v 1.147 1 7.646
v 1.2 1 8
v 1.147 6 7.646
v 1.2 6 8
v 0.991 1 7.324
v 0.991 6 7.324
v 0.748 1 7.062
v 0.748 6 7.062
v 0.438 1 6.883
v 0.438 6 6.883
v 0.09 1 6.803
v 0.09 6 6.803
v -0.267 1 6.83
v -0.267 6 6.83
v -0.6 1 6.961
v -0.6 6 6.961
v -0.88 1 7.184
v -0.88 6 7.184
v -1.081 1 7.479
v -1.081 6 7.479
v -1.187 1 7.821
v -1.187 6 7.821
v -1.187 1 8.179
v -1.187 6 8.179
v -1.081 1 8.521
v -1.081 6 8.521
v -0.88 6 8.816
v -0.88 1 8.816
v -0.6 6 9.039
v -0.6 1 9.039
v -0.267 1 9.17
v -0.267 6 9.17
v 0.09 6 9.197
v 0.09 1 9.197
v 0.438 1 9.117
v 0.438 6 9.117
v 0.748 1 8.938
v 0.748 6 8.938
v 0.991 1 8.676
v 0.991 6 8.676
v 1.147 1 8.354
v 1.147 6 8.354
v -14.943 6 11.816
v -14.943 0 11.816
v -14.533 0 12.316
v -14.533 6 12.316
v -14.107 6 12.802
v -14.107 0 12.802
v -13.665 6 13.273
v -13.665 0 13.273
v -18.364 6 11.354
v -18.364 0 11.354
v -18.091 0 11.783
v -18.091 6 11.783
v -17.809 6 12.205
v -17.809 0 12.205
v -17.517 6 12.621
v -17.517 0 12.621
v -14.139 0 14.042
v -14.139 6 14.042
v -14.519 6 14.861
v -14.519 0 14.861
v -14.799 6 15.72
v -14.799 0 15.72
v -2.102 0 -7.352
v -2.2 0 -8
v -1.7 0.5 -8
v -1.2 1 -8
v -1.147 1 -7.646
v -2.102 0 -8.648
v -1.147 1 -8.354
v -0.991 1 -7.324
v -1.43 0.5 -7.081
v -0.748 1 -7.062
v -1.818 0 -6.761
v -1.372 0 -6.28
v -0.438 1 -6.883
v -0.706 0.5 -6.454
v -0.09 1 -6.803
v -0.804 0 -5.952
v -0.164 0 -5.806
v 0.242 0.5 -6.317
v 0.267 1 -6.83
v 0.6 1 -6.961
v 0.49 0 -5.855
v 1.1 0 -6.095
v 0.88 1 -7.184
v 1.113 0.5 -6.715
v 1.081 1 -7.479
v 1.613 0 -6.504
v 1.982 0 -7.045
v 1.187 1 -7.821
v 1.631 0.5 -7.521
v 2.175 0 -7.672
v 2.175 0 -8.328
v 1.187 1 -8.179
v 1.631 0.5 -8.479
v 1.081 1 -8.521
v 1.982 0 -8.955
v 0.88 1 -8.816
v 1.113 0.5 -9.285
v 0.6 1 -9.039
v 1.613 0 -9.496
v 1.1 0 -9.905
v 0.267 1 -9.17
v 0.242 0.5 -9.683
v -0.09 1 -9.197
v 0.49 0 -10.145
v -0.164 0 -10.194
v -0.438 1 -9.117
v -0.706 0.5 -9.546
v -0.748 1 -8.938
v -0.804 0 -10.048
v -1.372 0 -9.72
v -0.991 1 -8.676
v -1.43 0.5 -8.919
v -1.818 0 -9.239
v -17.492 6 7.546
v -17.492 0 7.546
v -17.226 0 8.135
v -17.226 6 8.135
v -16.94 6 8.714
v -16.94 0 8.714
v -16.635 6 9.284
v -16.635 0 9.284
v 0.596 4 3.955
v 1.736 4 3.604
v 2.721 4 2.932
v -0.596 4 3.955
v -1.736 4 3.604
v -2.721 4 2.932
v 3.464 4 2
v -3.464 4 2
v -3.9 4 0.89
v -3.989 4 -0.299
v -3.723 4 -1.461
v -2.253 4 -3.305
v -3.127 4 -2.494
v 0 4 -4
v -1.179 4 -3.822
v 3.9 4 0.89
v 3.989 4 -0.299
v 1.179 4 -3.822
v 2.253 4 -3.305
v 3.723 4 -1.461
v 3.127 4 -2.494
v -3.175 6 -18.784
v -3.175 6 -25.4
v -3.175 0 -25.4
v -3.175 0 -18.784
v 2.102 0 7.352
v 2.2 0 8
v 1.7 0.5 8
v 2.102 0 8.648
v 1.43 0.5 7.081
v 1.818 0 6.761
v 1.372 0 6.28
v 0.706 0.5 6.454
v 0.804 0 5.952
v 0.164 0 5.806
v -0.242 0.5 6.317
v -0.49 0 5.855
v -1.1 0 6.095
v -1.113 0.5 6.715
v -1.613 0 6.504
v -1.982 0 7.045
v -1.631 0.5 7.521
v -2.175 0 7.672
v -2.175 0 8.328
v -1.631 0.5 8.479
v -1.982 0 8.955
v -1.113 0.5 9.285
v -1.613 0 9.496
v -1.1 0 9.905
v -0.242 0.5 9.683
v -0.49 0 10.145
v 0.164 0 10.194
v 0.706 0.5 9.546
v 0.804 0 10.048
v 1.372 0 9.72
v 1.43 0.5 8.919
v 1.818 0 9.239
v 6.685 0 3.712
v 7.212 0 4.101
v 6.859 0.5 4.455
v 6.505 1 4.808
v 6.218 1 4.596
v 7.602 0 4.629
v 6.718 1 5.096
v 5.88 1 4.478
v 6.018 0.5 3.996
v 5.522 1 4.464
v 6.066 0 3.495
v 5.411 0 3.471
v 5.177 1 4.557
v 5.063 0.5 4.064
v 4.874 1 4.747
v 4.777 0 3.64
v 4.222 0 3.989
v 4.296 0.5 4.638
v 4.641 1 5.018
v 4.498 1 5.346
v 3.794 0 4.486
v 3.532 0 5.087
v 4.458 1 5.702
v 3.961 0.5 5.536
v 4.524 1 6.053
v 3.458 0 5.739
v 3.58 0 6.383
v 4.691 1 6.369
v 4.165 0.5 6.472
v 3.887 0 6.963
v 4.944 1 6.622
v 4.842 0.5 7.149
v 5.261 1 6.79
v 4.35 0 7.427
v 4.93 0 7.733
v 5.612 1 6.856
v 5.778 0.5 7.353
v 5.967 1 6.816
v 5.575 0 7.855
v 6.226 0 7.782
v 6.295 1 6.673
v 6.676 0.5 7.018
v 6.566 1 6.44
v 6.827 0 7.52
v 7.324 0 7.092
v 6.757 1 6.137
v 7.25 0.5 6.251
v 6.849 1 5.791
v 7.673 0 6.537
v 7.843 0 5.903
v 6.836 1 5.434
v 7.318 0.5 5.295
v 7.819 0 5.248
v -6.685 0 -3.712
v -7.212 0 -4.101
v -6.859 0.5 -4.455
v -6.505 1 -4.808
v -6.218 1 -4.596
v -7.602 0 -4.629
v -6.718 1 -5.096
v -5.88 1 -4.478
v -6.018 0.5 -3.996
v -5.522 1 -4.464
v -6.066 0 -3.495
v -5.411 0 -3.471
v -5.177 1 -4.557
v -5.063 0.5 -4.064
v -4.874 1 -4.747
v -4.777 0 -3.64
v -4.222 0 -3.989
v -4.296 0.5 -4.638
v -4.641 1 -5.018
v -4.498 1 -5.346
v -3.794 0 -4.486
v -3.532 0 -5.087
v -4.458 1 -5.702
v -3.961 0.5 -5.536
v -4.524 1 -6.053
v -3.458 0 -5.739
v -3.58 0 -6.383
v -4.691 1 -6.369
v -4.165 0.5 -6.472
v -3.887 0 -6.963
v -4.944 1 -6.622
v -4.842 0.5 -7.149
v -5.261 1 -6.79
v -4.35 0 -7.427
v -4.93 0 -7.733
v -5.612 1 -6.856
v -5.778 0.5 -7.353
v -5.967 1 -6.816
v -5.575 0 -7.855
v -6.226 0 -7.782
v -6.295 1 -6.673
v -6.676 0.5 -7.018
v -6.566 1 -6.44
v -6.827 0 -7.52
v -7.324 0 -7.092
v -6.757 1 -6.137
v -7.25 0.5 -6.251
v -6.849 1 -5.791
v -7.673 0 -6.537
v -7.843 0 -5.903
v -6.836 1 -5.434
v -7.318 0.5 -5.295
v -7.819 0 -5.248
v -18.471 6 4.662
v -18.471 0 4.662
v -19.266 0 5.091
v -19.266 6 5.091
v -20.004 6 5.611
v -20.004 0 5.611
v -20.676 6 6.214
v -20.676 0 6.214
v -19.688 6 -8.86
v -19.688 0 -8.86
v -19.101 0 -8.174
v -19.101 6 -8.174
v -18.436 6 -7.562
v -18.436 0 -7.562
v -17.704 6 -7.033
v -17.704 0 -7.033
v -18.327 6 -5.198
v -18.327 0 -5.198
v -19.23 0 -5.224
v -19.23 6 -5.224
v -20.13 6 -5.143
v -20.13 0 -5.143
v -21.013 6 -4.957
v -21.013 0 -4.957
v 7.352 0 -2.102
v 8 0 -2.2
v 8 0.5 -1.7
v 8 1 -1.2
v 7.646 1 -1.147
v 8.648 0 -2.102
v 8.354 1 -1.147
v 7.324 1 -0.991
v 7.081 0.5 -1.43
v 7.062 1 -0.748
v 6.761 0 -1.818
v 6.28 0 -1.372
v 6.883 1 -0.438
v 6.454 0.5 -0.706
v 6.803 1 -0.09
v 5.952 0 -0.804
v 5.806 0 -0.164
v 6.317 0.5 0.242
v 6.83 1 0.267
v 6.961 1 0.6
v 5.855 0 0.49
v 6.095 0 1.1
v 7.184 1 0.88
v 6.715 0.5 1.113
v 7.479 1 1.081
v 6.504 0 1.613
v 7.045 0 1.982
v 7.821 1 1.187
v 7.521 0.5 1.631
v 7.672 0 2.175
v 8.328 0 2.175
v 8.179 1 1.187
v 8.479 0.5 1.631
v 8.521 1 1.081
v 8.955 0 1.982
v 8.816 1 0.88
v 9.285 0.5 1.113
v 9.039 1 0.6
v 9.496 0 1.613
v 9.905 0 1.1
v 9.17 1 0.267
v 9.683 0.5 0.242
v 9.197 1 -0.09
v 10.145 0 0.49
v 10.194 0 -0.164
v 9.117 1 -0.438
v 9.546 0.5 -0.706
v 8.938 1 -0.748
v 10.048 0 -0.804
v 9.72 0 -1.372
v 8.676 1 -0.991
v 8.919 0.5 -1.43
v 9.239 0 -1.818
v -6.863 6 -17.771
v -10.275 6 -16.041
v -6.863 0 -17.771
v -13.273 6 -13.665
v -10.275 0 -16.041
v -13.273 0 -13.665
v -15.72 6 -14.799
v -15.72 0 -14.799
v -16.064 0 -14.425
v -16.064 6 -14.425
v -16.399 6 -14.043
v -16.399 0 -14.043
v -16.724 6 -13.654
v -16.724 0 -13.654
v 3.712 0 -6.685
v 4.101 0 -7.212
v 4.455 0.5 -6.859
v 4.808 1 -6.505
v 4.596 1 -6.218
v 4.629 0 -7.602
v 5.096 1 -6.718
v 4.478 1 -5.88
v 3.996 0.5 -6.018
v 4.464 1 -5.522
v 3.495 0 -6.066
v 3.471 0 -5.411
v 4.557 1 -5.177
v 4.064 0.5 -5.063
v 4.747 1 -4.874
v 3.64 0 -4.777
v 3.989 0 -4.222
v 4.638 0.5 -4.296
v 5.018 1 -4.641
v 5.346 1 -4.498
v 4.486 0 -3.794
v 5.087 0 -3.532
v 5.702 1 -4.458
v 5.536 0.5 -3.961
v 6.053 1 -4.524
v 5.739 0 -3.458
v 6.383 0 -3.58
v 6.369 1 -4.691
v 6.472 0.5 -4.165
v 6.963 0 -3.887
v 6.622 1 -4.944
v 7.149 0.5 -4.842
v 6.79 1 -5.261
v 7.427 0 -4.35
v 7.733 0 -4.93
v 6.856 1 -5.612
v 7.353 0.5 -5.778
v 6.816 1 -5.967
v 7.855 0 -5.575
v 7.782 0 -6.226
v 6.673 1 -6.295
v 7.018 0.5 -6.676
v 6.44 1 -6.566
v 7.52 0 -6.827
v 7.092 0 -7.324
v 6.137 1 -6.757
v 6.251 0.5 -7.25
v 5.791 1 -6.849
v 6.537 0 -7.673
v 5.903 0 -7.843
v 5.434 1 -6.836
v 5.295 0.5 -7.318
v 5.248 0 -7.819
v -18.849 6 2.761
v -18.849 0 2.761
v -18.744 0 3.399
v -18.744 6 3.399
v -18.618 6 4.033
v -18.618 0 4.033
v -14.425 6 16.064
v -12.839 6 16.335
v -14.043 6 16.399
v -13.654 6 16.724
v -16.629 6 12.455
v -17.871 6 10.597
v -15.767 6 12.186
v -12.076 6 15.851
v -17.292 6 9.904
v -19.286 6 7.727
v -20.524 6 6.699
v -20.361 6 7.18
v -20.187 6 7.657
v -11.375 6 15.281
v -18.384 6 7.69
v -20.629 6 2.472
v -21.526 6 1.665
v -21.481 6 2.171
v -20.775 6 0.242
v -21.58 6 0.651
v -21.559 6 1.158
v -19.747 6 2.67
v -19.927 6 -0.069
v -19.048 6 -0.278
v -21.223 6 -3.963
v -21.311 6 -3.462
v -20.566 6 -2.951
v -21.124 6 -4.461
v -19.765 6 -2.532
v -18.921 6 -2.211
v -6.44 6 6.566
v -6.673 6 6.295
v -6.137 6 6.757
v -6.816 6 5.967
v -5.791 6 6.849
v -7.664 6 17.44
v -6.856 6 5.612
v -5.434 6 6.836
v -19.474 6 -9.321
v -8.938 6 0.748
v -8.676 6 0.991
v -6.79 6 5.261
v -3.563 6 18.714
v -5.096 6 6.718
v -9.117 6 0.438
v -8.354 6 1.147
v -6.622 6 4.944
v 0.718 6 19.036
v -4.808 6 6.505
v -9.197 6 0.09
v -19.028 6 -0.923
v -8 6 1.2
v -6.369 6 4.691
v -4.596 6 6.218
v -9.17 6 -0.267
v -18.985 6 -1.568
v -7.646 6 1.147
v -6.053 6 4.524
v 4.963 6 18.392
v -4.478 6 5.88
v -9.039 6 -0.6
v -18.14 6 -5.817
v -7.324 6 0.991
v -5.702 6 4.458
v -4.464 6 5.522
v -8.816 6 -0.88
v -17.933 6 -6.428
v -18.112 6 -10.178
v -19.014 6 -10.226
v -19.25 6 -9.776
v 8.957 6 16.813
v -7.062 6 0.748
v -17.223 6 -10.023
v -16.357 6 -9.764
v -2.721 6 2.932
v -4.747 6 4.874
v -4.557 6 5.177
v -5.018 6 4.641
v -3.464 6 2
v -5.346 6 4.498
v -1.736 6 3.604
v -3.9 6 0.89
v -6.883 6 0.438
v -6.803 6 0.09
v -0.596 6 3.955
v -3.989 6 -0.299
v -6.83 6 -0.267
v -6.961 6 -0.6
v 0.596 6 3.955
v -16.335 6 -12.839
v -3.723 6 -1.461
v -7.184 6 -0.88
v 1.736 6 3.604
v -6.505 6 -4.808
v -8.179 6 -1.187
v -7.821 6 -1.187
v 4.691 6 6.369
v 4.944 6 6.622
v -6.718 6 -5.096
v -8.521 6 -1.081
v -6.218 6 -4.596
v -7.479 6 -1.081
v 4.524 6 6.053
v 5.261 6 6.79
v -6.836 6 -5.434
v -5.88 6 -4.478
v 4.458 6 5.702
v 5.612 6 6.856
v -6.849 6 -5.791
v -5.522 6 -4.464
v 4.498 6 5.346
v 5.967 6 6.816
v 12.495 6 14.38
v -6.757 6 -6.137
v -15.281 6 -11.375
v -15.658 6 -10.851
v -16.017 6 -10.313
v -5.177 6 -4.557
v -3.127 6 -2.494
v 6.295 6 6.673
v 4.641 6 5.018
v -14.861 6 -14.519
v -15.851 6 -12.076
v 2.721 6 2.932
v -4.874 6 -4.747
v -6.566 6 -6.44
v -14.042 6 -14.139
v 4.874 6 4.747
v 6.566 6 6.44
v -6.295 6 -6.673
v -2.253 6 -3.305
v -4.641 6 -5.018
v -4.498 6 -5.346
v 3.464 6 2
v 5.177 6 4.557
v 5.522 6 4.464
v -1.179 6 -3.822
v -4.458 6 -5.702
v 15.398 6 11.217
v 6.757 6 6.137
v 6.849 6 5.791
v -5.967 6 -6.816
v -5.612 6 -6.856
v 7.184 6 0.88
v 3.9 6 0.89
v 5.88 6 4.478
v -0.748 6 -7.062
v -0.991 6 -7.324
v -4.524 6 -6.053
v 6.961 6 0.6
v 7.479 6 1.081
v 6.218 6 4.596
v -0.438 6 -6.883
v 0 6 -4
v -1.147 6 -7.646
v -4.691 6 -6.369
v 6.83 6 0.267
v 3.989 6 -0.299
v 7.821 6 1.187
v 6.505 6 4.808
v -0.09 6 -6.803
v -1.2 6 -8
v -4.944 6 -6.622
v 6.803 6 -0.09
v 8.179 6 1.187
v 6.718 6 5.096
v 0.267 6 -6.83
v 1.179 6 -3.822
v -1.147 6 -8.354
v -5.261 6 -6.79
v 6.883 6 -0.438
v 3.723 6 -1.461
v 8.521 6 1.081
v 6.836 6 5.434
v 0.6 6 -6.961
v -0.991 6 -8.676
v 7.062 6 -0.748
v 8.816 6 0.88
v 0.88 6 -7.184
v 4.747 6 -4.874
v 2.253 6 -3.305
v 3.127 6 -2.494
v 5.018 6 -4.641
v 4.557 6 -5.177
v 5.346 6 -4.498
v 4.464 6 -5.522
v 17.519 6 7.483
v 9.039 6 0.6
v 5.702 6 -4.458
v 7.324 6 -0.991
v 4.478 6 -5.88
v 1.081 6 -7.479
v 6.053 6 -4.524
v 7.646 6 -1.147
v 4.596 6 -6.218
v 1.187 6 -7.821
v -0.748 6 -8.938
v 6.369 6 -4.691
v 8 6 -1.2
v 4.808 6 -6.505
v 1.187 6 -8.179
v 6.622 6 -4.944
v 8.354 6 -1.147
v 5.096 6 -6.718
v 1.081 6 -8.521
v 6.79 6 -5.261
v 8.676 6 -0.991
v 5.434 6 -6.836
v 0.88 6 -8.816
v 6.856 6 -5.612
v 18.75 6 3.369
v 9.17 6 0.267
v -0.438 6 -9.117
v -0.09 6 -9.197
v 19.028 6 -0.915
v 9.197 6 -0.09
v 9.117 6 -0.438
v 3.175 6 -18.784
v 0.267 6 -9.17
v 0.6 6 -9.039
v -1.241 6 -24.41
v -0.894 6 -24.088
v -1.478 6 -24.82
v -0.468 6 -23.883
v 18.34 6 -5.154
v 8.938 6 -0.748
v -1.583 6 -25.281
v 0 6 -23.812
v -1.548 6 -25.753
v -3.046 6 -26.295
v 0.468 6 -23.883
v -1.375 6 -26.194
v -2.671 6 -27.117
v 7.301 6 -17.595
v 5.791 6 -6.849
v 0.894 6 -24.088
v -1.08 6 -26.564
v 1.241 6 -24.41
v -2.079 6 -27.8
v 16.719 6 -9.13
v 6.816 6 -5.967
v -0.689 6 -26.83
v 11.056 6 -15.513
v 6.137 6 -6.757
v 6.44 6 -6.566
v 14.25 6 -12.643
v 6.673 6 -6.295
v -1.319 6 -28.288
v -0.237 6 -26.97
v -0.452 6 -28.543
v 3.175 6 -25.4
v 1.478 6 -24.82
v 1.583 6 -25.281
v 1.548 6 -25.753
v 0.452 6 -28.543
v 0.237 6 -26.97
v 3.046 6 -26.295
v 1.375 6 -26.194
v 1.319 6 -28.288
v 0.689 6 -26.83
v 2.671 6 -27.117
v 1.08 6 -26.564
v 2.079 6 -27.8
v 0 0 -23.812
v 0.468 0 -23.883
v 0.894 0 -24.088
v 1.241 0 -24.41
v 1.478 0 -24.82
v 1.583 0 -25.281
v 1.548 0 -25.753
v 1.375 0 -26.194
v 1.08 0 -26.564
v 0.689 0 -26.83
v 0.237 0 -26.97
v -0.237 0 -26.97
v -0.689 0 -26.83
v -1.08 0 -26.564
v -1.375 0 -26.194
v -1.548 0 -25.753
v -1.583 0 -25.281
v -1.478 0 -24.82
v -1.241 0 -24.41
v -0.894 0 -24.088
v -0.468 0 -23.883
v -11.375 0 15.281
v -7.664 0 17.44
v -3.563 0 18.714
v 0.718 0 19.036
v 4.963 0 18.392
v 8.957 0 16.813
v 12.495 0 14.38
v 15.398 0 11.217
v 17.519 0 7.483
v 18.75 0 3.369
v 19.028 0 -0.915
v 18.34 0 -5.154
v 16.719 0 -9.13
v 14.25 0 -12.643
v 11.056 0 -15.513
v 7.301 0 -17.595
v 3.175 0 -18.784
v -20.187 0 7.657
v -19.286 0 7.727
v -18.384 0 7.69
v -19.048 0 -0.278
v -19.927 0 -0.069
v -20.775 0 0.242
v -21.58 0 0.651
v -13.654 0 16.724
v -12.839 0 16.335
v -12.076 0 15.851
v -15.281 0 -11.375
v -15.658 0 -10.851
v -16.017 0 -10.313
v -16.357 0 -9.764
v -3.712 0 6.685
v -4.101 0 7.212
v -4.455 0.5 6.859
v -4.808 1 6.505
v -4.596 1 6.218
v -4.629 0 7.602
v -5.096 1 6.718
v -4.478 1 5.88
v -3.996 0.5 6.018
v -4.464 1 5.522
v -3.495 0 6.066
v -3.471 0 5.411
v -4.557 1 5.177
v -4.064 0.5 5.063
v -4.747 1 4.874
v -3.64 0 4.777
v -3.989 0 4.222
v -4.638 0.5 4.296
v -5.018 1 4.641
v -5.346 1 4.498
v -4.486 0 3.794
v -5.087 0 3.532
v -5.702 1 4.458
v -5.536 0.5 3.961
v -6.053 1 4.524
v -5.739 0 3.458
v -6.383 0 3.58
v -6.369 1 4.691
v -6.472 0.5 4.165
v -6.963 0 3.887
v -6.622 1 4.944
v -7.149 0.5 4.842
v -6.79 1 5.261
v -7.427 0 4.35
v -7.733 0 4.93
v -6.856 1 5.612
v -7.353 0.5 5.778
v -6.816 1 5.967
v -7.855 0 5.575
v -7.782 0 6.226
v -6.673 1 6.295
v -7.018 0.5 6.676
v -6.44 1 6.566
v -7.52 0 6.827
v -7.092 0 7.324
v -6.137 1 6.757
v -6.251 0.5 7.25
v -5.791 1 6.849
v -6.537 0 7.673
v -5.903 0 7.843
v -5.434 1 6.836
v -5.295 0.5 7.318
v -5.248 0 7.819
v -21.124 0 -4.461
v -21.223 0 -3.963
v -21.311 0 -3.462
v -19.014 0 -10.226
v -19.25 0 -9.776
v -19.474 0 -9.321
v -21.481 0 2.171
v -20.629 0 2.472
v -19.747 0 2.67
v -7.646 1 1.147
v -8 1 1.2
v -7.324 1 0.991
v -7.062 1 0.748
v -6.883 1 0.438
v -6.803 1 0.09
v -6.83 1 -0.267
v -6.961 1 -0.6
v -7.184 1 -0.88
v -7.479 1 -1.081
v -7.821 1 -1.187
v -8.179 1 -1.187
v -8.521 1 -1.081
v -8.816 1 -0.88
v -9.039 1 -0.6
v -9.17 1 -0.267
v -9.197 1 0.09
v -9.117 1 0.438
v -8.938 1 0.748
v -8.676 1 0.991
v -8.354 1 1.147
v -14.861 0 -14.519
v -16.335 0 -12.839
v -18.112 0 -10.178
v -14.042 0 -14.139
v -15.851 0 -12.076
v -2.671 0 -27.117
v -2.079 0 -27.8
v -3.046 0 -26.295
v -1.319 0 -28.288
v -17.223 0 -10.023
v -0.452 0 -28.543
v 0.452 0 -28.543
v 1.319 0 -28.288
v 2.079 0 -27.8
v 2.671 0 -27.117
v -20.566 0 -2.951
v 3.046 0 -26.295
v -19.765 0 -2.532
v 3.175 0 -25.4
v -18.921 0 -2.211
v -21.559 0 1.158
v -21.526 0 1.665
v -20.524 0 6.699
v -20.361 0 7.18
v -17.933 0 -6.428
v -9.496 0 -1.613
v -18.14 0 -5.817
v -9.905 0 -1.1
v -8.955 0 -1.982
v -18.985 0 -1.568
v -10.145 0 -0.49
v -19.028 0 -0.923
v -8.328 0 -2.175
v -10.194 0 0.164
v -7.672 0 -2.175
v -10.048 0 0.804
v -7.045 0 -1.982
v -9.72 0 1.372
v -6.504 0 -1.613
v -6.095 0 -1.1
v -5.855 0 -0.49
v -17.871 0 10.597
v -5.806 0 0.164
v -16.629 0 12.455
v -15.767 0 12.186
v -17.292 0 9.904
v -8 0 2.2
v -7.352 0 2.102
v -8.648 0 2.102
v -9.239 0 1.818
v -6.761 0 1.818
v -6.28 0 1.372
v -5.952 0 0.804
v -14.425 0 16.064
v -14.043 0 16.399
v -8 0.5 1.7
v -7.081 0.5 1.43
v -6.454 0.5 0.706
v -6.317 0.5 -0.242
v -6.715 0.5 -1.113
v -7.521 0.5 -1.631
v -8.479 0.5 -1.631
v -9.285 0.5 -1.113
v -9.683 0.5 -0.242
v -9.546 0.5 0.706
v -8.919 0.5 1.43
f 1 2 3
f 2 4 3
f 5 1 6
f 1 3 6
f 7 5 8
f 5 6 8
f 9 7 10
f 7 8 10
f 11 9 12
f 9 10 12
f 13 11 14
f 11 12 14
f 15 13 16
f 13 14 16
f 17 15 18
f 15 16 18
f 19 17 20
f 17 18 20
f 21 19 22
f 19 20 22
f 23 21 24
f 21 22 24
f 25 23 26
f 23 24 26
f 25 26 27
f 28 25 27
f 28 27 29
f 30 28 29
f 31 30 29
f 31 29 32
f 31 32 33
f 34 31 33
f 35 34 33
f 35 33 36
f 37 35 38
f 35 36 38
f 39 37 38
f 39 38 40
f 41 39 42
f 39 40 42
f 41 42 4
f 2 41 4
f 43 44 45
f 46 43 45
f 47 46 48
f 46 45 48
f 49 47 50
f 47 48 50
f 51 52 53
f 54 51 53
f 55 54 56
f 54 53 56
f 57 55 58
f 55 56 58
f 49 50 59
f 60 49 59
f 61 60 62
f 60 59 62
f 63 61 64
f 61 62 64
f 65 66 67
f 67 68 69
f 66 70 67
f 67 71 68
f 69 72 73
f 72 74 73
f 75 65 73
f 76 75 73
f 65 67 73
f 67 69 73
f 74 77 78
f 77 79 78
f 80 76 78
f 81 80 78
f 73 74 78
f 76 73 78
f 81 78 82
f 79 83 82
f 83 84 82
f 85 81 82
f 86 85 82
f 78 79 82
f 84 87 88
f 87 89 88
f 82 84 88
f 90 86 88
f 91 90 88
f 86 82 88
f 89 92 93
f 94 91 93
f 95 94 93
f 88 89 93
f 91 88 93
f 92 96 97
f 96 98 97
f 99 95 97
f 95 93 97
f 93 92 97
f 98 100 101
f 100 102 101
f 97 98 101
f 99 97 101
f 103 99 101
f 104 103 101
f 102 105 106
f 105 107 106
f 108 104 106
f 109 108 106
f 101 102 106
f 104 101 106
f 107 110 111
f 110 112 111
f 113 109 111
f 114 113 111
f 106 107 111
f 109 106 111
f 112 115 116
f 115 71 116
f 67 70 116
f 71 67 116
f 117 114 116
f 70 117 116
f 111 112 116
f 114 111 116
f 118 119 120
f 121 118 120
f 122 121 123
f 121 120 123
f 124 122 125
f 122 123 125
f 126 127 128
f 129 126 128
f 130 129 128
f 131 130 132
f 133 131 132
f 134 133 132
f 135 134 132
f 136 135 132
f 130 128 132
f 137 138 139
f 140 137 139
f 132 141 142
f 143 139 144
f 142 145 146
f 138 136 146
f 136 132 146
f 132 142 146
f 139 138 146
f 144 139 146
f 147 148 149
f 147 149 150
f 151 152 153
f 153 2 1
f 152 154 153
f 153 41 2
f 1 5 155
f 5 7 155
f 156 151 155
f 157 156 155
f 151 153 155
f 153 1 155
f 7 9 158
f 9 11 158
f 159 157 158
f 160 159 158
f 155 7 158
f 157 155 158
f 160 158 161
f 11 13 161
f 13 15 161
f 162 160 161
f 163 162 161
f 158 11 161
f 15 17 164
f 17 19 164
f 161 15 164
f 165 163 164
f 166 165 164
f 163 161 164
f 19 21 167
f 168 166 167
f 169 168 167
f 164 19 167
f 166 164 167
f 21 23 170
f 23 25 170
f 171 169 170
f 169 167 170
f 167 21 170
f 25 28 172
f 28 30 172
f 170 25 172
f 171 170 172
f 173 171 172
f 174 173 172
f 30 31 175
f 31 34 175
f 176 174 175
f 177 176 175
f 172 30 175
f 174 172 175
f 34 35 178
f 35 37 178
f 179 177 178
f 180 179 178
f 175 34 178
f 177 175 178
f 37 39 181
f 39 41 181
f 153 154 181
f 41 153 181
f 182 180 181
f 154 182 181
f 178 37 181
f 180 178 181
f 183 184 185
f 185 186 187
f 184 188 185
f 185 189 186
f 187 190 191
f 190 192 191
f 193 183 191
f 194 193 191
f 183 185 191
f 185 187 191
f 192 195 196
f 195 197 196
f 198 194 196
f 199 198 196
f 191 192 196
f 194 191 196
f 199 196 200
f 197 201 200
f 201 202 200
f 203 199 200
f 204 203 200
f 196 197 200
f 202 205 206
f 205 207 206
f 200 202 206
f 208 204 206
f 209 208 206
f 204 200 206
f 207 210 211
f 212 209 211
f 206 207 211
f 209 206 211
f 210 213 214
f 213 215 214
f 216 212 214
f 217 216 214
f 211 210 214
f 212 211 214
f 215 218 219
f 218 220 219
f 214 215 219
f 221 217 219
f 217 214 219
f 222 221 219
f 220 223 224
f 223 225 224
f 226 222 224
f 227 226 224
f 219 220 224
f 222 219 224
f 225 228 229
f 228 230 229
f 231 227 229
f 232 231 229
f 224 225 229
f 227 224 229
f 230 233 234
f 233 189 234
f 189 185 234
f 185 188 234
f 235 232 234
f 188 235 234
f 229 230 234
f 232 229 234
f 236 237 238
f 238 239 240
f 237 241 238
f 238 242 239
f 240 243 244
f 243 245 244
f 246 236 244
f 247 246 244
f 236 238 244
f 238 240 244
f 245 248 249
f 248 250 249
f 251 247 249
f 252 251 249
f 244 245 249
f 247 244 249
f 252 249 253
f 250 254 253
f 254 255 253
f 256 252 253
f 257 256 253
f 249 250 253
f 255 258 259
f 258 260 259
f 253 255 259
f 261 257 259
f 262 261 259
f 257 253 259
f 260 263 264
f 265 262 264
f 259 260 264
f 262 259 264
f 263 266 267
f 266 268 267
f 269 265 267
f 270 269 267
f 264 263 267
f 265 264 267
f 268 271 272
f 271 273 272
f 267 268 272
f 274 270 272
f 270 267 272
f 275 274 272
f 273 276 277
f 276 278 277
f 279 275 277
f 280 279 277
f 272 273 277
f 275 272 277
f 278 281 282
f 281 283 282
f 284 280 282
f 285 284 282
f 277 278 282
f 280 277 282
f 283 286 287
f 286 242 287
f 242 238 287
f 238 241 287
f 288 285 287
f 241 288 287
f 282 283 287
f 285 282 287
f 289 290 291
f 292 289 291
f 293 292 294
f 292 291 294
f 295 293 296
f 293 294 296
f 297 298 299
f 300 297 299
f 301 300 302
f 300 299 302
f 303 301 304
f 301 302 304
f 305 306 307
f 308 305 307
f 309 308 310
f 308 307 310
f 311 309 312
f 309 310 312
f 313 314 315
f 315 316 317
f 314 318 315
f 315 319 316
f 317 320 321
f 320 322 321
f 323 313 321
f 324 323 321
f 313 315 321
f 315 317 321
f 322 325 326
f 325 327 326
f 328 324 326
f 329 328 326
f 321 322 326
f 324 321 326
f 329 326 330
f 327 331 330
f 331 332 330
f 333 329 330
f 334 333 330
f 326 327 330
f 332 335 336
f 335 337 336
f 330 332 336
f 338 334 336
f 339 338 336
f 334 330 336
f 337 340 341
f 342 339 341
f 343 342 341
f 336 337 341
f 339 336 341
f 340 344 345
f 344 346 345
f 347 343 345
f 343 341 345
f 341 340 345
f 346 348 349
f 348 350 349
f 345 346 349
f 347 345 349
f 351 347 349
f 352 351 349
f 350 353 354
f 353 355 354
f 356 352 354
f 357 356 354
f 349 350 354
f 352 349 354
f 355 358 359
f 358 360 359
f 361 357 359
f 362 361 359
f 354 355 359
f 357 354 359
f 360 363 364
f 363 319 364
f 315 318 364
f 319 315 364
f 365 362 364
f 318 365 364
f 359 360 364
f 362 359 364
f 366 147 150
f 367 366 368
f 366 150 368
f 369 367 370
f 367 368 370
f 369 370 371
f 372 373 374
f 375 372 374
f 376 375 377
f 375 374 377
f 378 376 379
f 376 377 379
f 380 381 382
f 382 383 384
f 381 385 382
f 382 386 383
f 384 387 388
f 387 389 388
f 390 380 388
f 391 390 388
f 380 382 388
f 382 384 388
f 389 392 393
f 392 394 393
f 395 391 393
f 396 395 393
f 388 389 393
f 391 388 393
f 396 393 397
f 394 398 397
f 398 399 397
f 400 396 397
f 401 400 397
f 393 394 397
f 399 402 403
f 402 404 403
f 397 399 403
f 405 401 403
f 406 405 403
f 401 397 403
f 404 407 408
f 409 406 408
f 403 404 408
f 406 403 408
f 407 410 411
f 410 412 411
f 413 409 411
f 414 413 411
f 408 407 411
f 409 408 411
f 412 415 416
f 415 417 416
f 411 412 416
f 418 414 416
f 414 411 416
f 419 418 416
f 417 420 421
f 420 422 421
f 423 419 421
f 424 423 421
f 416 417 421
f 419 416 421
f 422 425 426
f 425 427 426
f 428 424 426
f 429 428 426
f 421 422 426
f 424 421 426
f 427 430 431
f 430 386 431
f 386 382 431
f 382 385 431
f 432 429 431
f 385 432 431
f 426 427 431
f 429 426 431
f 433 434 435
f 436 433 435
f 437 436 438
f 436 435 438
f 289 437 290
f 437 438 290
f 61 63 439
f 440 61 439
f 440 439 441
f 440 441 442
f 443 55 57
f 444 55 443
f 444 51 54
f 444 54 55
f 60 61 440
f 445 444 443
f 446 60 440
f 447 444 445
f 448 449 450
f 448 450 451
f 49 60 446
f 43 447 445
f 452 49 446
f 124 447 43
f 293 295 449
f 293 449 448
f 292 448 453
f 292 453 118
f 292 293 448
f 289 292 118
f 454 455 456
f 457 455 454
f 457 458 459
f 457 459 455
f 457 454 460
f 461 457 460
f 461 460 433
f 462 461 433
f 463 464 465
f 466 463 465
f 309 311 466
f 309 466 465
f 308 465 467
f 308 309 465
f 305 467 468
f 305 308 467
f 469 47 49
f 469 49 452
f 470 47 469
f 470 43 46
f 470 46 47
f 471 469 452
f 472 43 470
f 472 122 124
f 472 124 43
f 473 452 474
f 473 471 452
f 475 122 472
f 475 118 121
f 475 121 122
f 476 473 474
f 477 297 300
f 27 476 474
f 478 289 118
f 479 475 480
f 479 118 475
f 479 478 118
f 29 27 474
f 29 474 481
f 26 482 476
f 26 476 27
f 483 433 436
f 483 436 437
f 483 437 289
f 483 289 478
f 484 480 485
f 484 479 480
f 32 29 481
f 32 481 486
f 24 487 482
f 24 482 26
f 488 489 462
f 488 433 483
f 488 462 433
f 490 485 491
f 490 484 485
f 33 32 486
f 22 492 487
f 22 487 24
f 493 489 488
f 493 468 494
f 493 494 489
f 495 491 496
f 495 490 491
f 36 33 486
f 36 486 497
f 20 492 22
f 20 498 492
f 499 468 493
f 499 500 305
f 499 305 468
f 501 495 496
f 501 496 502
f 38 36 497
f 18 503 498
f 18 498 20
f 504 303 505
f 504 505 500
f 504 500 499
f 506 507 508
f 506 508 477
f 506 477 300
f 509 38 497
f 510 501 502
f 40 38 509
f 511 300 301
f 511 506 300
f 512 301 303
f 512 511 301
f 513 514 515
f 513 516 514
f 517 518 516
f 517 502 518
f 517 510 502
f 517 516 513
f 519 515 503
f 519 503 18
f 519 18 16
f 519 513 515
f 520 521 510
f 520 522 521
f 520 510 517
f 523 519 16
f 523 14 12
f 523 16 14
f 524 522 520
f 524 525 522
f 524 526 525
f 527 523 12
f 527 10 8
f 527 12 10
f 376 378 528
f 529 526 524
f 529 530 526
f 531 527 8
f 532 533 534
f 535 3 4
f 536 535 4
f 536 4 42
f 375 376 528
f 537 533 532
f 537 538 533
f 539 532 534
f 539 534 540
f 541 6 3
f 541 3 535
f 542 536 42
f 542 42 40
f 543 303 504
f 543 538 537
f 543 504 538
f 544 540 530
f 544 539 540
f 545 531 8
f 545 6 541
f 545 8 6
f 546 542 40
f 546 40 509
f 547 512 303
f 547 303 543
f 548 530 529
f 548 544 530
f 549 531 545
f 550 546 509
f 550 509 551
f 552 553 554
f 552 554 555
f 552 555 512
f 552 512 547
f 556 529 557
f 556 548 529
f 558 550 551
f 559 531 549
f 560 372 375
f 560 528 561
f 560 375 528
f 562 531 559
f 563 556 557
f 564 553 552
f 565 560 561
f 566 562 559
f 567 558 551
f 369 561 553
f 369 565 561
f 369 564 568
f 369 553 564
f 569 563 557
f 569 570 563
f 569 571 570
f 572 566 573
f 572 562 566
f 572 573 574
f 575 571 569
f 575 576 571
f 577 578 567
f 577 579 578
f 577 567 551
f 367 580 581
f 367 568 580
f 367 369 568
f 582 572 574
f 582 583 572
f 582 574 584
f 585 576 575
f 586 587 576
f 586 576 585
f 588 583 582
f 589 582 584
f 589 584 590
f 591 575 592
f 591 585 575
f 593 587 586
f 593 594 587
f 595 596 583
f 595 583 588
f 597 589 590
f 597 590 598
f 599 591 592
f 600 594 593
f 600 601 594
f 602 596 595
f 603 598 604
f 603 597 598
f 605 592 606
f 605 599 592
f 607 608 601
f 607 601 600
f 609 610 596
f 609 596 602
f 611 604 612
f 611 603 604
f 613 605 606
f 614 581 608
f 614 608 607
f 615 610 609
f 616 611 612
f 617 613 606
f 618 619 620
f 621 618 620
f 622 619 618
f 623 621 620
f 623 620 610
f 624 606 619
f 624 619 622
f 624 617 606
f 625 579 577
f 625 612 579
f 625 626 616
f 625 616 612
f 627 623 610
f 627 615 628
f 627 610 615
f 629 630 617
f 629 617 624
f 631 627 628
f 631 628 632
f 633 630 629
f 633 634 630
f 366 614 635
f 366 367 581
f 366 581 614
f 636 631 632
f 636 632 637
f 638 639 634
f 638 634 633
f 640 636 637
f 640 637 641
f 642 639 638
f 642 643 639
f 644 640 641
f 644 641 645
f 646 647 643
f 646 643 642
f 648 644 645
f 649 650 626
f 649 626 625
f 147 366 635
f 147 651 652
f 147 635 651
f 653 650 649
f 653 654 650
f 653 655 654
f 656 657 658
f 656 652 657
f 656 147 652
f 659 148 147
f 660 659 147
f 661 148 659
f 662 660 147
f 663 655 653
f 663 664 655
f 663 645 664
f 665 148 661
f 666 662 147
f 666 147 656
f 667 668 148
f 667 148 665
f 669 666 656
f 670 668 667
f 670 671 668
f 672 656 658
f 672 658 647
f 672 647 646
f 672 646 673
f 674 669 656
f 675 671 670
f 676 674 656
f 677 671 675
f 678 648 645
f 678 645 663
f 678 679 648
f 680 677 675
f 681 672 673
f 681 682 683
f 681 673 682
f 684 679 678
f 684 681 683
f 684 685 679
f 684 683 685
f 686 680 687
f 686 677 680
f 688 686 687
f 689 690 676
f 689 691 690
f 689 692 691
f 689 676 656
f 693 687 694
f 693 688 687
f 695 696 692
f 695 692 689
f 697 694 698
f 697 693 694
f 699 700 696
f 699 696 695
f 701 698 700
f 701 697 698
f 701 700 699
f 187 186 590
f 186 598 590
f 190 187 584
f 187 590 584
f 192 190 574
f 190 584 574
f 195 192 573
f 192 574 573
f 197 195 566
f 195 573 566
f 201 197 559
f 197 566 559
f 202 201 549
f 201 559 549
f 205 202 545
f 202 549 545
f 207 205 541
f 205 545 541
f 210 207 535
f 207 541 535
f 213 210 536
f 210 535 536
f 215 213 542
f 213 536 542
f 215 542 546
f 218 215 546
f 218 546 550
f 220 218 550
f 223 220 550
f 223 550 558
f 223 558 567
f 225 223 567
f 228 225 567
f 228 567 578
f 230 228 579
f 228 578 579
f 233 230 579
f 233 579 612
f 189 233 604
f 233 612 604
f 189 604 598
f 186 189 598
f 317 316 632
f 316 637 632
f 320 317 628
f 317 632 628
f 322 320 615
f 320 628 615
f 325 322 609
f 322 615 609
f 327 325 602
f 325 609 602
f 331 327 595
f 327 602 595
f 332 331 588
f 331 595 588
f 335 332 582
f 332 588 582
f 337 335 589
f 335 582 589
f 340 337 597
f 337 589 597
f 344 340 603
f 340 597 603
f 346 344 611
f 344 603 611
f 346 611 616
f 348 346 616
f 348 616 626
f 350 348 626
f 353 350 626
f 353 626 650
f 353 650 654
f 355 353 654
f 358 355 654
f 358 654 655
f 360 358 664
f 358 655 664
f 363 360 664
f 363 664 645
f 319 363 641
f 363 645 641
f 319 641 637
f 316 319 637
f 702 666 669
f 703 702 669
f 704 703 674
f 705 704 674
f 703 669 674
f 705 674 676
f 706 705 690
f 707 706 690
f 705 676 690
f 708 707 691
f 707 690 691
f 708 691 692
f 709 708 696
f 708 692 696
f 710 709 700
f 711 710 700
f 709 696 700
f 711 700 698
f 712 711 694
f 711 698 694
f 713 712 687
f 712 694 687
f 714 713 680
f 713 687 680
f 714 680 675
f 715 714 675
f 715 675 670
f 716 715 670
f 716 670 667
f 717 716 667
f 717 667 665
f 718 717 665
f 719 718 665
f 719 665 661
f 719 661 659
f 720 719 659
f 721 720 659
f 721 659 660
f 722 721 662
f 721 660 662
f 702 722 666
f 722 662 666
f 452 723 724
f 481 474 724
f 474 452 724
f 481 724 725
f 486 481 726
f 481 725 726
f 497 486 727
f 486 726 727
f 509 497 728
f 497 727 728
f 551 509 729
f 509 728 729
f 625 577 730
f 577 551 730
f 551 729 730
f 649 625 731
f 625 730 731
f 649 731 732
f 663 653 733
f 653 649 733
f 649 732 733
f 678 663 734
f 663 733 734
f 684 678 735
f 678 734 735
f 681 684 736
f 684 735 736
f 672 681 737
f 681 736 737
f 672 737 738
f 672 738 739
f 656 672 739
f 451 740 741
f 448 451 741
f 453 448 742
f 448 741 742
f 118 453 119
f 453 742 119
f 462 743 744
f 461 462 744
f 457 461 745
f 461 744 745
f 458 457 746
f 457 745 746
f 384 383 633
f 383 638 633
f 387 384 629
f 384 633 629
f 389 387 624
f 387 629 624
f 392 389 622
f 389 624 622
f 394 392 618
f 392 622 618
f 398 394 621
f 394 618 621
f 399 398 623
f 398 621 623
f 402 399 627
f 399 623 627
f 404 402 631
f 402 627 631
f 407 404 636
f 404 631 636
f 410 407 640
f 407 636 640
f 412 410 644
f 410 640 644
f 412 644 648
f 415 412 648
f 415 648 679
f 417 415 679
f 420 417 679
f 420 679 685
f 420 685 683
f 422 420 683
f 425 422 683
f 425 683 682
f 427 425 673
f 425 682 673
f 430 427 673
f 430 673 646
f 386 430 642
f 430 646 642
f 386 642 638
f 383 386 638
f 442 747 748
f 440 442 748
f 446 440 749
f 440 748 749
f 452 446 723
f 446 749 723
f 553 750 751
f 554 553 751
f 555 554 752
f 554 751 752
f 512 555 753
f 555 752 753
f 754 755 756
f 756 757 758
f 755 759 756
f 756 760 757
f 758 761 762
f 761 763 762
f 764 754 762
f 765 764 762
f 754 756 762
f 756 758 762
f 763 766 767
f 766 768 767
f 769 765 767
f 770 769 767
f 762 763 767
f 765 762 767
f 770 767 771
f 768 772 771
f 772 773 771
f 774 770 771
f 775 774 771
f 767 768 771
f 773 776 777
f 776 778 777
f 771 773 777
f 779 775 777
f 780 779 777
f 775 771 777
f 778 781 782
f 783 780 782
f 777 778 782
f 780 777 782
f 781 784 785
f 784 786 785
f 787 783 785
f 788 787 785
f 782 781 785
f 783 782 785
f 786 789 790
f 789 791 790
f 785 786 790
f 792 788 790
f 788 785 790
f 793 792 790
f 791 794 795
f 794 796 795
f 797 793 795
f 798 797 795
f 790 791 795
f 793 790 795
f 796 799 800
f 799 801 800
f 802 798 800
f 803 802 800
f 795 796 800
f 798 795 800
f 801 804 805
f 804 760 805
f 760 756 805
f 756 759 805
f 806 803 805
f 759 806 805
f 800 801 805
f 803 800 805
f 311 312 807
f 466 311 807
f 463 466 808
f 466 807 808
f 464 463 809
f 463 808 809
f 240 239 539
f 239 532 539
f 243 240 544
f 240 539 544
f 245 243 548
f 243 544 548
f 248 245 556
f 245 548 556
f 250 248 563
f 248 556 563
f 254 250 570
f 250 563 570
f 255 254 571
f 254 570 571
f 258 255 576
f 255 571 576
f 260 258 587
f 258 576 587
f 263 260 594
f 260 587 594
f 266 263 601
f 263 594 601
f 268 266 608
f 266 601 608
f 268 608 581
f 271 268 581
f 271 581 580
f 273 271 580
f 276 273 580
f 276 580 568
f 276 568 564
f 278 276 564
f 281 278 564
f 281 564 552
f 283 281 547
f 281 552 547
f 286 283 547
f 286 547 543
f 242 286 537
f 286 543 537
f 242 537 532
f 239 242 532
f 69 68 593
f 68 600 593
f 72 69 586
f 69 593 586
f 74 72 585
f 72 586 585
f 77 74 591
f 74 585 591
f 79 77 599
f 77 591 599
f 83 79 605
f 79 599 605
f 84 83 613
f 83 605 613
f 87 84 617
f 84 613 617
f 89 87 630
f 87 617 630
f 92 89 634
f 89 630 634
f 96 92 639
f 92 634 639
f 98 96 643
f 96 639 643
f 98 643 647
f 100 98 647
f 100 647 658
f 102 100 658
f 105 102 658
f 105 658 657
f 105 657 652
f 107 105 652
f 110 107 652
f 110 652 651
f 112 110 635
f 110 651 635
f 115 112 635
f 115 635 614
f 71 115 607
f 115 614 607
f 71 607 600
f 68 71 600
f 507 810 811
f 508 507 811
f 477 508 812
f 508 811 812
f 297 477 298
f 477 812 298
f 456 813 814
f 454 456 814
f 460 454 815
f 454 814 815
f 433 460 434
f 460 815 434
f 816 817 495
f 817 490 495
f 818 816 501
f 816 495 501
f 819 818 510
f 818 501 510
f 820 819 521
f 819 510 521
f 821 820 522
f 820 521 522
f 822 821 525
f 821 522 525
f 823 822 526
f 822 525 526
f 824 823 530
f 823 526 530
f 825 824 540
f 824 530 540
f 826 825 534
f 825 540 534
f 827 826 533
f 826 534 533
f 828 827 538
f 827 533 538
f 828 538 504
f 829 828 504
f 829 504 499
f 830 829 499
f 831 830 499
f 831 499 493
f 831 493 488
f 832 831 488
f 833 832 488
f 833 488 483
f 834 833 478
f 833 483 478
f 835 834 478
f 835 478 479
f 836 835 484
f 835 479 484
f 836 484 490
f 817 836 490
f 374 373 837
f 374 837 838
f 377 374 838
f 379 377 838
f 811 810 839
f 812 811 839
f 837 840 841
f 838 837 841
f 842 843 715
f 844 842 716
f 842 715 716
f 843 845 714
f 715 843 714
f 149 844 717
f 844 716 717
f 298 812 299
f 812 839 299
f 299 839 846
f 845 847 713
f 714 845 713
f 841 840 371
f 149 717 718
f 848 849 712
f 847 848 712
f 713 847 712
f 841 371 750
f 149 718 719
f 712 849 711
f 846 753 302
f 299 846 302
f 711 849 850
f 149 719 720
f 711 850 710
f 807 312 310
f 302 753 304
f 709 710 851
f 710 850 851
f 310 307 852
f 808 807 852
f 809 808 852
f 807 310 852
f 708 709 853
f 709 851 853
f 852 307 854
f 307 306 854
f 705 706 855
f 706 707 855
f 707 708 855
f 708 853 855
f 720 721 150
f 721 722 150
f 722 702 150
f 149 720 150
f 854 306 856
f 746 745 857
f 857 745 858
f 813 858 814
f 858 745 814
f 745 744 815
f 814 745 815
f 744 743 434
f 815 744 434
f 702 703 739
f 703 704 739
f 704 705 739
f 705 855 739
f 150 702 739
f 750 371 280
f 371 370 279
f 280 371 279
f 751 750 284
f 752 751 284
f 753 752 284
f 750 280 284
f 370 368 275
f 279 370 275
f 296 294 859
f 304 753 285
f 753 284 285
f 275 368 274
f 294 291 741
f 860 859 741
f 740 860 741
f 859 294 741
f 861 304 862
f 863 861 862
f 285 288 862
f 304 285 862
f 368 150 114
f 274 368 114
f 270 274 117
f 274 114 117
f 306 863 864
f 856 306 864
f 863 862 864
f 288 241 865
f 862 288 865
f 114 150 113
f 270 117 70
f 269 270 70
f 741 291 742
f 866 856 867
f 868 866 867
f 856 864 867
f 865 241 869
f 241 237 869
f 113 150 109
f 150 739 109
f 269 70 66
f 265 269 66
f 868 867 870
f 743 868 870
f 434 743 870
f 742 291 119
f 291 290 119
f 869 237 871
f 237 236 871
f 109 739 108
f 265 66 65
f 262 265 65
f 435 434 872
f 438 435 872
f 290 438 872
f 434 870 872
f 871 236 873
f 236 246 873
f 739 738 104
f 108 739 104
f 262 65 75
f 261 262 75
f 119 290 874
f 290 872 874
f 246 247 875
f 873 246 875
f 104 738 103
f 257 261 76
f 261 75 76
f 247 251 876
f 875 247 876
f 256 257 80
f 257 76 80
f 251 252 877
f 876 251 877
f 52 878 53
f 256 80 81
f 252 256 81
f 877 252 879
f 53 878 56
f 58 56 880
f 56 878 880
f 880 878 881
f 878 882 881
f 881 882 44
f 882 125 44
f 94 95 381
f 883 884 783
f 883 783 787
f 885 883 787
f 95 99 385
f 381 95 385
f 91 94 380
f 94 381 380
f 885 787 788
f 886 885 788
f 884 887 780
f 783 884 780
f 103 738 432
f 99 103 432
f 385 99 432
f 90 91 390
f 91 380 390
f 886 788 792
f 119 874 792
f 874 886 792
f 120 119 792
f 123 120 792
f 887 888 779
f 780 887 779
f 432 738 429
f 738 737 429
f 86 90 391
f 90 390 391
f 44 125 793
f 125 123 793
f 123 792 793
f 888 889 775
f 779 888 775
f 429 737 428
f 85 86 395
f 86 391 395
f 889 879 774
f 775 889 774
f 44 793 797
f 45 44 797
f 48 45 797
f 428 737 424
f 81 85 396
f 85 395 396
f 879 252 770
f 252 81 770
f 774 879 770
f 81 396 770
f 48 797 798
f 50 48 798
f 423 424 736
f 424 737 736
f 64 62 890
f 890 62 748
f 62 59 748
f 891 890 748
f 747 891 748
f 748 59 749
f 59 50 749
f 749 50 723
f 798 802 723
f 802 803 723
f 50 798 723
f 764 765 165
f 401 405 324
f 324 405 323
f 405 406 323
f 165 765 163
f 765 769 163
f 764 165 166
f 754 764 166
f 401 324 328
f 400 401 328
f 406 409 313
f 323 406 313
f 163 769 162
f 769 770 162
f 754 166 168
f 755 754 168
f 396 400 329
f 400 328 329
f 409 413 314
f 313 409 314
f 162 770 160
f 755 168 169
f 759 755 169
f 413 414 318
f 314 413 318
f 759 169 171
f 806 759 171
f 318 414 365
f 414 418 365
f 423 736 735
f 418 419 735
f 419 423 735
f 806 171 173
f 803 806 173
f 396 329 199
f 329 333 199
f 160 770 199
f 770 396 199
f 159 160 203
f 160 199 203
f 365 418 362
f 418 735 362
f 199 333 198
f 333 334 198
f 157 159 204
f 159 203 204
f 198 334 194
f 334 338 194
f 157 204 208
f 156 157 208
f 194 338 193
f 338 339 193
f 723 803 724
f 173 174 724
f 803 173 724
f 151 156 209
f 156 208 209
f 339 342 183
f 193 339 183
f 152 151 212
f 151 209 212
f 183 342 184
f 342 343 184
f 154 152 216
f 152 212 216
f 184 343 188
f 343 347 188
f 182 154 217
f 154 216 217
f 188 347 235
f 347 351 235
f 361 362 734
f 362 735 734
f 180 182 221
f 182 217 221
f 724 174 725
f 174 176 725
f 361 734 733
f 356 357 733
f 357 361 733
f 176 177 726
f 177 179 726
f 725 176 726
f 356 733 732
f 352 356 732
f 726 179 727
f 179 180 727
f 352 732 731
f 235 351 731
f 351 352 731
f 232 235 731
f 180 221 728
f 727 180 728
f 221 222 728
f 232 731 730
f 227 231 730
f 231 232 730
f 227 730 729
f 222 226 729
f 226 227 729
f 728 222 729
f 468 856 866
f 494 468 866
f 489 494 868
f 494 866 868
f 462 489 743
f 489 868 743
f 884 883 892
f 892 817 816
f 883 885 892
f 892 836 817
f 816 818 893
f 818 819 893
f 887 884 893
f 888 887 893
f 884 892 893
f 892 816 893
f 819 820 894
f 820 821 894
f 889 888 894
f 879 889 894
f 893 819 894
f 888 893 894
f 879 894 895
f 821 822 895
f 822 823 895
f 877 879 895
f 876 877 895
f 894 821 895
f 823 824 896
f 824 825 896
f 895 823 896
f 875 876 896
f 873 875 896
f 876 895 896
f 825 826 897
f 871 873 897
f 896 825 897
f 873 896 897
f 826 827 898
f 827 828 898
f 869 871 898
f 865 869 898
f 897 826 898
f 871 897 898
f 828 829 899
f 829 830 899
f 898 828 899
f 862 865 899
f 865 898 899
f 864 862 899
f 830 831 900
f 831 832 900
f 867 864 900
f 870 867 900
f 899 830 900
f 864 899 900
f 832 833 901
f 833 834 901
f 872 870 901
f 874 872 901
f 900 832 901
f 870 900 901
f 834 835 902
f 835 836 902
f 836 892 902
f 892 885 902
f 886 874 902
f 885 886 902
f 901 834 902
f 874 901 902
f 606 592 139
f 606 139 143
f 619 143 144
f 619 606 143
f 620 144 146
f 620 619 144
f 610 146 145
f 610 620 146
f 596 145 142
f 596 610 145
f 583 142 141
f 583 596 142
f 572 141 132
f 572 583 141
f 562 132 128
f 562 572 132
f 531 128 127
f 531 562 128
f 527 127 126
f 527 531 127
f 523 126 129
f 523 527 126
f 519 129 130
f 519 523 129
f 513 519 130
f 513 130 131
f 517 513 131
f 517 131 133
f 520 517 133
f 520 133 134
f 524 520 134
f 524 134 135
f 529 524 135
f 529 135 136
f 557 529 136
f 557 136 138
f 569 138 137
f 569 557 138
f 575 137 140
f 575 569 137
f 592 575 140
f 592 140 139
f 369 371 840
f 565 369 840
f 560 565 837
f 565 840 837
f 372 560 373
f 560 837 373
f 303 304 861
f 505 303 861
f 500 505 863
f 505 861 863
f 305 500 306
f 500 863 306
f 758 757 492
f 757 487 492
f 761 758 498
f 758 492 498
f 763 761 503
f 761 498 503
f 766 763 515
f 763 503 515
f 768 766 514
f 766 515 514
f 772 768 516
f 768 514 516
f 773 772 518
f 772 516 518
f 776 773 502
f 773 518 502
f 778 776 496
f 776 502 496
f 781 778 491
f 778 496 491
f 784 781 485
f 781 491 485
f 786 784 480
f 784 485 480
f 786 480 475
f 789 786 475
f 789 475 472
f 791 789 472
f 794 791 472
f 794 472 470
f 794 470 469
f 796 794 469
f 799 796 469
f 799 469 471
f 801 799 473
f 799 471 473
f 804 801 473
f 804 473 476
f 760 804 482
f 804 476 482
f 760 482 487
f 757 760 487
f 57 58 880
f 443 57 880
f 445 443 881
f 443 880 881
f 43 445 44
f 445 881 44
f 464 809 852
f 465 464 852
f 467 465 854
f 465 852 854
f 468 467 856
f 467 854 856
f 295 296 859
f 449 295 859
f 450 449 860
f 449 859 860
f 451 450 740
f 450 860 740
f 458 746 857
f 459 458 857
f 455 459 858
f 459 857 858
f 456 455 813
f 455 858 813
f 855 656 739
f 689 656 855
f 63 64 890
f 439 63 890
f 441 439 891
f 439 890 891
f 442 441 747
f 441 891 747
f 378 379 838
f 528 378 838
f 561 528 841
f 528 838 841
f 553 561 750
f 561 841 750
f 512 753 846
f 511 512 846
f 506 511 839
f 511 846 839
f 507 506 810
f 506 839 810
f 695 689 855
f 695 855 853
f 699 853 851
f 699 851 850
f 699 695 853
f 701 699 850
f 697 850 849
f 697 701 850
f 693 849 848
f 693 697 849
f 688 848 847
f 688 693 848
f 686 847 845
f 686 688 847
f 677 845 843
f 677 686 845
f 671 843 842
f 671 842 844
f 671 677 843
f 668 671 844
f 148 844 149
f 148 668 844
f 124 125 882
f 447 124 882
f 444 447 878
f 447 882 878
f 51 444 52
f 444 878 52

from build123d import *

# Parameters (mm, degrees)
SKETCH1_R                                       = 19.05
BOSS_EXTRUDE1_DEPTH                             = 6
SKETCH8_R                                       = 4
CUT_EXTRUDE4_DEPTH                              = 2
BOSS_EXTRUDE3_DEPTH                             = 6
CIRPATTERN2_DEPTH                               = 6
SKETCH4_R                                       = 1.5875
BOSS_EXTRUDE4_DEPTH                             = 6
CSK_FOR_M2_FLAT_HEAD_MACHINE_SCREW1_D           = 2.4
CSK_FOR_M2_FLAT_HEAD_MACHINE_SCREW1_CSINK_D     = 4.4
CSK_FOR_M2_FLAT_HEAD_MACHINE_SCREW1_CSINK_ANGLE = 90
CIRPATTERN3_COUNT                               = 8


# Read off the part's stored shape, not the designer's step: CirPattern2
with BuildPart() as part:
    # Sketch1 → Boss-Extrude1 (new body)
    with BuildSketch(Plane(origin=(0, 0, 0), x_dir=(1, 0, 0), z_dir=(0, 1, 0))):
        with Locations(Location((0, 0, 0), (0, 0, 270))):
            Circle(SKETCH1_R)
    extrude(amount=BOSS_EXTRUDE1_DEPTH)

    # Sketch8 → Cut-Extrude4 (cut)
    with BuildSketch(Plane.XZ.offset(-6)):
        with Locations(Location((0, 0, 0), (0, 0, 270))):
            Circle(SKETCH8_R)
    extrude(amount=CUT_EXTRUDE4_DEPTH, mode=Mode.SUBTRACT)

    # Sketch3 → Boss-Extrude3 (add)
    with BuildSketch(Plane(origin=(0, 0, 0), x_dir=(1, 0, 0), z_dir=(0, 1, 0))):
        with BuildLine():
            ThreePointArc((-18.32709122, 5.198098444), (-19.680979383, 5.197152008), (-21.013329851, 4.956618665))
            ThreePointArc((-21.013329851, 4.956618665), (-21.175154204, 4.212000052), (-21.310601203, 3.462134657))
            ThreePointArc((-21.310601203, 3.462134657), (-20.171718001, 2.730042376), (-18.921250622, 2.211057413))
            ThreePointArc((-18.921250622, 2.211057413), (-18.683959592, 3.716470634), (-18.32709122, 5.198098444))
        make_face()
    extrude(amount=BOSS_EXTRUDE3_DEPTH)

    # CirPattern2 outline → CirPattern2 (add)
    with BuildSketch(Plane(origin=(0, 0, 0), x_dir=(1, 0, 0), z_dir=(0, 1, 0))):
        with BuildLine():
            ThreePointArc((-17.704260875, 7.032897477), (-17.085425728, 8.425599549), (-16.357243856, 9.764377784))
            ThreePointArc((-16.357243856, 9.764377784), (-17.665244353, 10.113875638), (-19.014450689, 10.226375946))
            ThreePointArc((-19.014450689, 10.226375946), (-19.36348249, 9.549012822), (-19.688393689, 8.859754733))
            ThreePointArc((-19.688393689, 8.859754733), (-18.777796417, 7.857843228), (-17.704260875, 7.032897477))
        make_face()
        with BuildLine():
            ThreePointArc((-15.280755006, 11.375457202), (-14.322548335, 12.560537779), (-13.272677354, 13.665230916))
            ThreePointArc((-13.272677354, 13.665230916), (-14.445652113, 14.341355358), (-15.719768136, 14.799222606))
            ThreePointArc((-15.719768136, 14.799222606), (-16.232221443, 14.235276148), (-16.724454683, 13.653597166))
            ThreePointArc((-16.724454683, 13.653597166), (-16.104199039, 12.450145051), (-15.280755006, 11.375457202))
        make_face()
        with BuildLine():
            ThreePointArc((-11.375457197, -15.280755), (-12.560537774, -14.322548329), (-13.66523091, -13.272677349))
            ThreePointArc((-13.66523091, -13.272677349), (-14.341355358, -14.445652113), (-14.799222606, -15.719768136))
            ThreePointArc((-14.799222606, -15.719768136), (-14.235276148, -16.232221443), (-13.653597166, -16.724454683))
            ThreePointArc((-13.653597166, -16.724454683), (-12.450145051, -16.104199039), (-11.375457197, -15.280755))
        make_face()
        with BuildLine():
            ThreePointArc((-14.942798311, -11.81589093), (-15.839496111, -10.583612937), (-16.634821136, -9.28359982))
            ThreePointArc((-16.634821136, -9.28359982), (-17.59149541, -10.241612555), (-18.363526703, -11.353809363))
            ThreePointArc((-18.363526703, -11.353809363), (-17.95142893, -11.994761331), (-17.516969515, -12.620771728))
            ThreePointArc((-17.516969515, -12.620771728), (-16.193990063, -12.33312711), (-14.942798311, -11.81589093))
        make_face()
        with BuildLine():
            ThreePointArc((-17.491812414, -7.545793421), (-18.039018964, -6.123421813), (-18.470775793, -4.661860306))
            ThreePointArc((-18.470775793, -4.661860306), (-19.642804121, -5.339624026), (-20.676386801, -6.214107244))
            ThreePointArc((-20.676386801, -6.214107244), (-20.444221496, -6.939878056), (-20.18658934, -7.657004037))
            ThreePointArc((-20.18658934, -7.657004037), (-18.834241415, -7.72157295), (-17.491812414, -7.545793421))
        make_face()
        with BuildLine():
            ThreePointArc((-21.580185309, -0.650923987), (-21.543774153, -1.41205356), (-21.480526461, -2.171424174))
            ThreePointArc((-21.480526461, -2.171424174), (-20.190970338, -2.583806354), (-18.84878841, -2.761462559))
            ThreePointArc((-18.84878841, -2.761462559), (-19.009212486, -1.245929612), (-19.047977604, 0.277577285))
            ThreePointArc((-19.047977604, 0.277577285), (-20.355488193, -0.073748943), (-21.580185309, -0.650923987))
        make_face()
    extrude(amount=CIRPATTERN2_DEPTH)

    # Sketch4 → Boss-Extrude4 (add)
    with BuildSketch(Plane(origin=(0, 6, 0), x_dir=(1, 0, 0), z_dir=(0, 1, 0))):
        with BuildLine():
            Line((-3.175, 4.000000056), (3.175, 4.000000056))
            Line((3.175, 4.000000056), (3.175, 25.4))
            ThreePointArc((3.175, 25.4), (0, 28.575), (-3.175, 25.4))
            Line((-3.175, 25.4), (-3.175, 4.000000056))
        make_face()
        with Locations(Location((0, 25.4, 0), (0, 0, 270))):
            Circle(SKETCH4_R, mode=Mode.SUBTRACT)
    extrude(amount=-BOSS_EXTRUDE4_DEPTH)

    # CSK for M2 Flat Head Machine Screw1 (through all)
    with Locations(Plane.XZ):
        with Locations((0, -8)):
            csk_for_m2_flat_head_machine_screw1 = CounterSinkHole(CSK_FOR_M2_FLAT_HEAD_MACHINE_SCREW1_D / 2, CSK_FOR_M2_FLAT_HEAD_MACHINE_SCREW1_CSINK_D / 2, counter_sink_angle=CSK_FOR_M2_FLAT_HEAD_MACHINE_SCREW1_CSINK_ANGLE)

    # CirPattern3: CSK for M2 Flat Head Machine Screw1 ×8 about axis
    cirpattern3_axis = Axis((0, 0, 0), (0, 1, 0))
    for i in range(1, CIRPATTERN3_COUNT):
        add(csk_for_m2_flat_head_machine_screw1.rotate(cirpattern3_axis, i * 360 / CIRPATTERN3_COUNT), mode=Mode.SUBTRACT)


solid = part.part
